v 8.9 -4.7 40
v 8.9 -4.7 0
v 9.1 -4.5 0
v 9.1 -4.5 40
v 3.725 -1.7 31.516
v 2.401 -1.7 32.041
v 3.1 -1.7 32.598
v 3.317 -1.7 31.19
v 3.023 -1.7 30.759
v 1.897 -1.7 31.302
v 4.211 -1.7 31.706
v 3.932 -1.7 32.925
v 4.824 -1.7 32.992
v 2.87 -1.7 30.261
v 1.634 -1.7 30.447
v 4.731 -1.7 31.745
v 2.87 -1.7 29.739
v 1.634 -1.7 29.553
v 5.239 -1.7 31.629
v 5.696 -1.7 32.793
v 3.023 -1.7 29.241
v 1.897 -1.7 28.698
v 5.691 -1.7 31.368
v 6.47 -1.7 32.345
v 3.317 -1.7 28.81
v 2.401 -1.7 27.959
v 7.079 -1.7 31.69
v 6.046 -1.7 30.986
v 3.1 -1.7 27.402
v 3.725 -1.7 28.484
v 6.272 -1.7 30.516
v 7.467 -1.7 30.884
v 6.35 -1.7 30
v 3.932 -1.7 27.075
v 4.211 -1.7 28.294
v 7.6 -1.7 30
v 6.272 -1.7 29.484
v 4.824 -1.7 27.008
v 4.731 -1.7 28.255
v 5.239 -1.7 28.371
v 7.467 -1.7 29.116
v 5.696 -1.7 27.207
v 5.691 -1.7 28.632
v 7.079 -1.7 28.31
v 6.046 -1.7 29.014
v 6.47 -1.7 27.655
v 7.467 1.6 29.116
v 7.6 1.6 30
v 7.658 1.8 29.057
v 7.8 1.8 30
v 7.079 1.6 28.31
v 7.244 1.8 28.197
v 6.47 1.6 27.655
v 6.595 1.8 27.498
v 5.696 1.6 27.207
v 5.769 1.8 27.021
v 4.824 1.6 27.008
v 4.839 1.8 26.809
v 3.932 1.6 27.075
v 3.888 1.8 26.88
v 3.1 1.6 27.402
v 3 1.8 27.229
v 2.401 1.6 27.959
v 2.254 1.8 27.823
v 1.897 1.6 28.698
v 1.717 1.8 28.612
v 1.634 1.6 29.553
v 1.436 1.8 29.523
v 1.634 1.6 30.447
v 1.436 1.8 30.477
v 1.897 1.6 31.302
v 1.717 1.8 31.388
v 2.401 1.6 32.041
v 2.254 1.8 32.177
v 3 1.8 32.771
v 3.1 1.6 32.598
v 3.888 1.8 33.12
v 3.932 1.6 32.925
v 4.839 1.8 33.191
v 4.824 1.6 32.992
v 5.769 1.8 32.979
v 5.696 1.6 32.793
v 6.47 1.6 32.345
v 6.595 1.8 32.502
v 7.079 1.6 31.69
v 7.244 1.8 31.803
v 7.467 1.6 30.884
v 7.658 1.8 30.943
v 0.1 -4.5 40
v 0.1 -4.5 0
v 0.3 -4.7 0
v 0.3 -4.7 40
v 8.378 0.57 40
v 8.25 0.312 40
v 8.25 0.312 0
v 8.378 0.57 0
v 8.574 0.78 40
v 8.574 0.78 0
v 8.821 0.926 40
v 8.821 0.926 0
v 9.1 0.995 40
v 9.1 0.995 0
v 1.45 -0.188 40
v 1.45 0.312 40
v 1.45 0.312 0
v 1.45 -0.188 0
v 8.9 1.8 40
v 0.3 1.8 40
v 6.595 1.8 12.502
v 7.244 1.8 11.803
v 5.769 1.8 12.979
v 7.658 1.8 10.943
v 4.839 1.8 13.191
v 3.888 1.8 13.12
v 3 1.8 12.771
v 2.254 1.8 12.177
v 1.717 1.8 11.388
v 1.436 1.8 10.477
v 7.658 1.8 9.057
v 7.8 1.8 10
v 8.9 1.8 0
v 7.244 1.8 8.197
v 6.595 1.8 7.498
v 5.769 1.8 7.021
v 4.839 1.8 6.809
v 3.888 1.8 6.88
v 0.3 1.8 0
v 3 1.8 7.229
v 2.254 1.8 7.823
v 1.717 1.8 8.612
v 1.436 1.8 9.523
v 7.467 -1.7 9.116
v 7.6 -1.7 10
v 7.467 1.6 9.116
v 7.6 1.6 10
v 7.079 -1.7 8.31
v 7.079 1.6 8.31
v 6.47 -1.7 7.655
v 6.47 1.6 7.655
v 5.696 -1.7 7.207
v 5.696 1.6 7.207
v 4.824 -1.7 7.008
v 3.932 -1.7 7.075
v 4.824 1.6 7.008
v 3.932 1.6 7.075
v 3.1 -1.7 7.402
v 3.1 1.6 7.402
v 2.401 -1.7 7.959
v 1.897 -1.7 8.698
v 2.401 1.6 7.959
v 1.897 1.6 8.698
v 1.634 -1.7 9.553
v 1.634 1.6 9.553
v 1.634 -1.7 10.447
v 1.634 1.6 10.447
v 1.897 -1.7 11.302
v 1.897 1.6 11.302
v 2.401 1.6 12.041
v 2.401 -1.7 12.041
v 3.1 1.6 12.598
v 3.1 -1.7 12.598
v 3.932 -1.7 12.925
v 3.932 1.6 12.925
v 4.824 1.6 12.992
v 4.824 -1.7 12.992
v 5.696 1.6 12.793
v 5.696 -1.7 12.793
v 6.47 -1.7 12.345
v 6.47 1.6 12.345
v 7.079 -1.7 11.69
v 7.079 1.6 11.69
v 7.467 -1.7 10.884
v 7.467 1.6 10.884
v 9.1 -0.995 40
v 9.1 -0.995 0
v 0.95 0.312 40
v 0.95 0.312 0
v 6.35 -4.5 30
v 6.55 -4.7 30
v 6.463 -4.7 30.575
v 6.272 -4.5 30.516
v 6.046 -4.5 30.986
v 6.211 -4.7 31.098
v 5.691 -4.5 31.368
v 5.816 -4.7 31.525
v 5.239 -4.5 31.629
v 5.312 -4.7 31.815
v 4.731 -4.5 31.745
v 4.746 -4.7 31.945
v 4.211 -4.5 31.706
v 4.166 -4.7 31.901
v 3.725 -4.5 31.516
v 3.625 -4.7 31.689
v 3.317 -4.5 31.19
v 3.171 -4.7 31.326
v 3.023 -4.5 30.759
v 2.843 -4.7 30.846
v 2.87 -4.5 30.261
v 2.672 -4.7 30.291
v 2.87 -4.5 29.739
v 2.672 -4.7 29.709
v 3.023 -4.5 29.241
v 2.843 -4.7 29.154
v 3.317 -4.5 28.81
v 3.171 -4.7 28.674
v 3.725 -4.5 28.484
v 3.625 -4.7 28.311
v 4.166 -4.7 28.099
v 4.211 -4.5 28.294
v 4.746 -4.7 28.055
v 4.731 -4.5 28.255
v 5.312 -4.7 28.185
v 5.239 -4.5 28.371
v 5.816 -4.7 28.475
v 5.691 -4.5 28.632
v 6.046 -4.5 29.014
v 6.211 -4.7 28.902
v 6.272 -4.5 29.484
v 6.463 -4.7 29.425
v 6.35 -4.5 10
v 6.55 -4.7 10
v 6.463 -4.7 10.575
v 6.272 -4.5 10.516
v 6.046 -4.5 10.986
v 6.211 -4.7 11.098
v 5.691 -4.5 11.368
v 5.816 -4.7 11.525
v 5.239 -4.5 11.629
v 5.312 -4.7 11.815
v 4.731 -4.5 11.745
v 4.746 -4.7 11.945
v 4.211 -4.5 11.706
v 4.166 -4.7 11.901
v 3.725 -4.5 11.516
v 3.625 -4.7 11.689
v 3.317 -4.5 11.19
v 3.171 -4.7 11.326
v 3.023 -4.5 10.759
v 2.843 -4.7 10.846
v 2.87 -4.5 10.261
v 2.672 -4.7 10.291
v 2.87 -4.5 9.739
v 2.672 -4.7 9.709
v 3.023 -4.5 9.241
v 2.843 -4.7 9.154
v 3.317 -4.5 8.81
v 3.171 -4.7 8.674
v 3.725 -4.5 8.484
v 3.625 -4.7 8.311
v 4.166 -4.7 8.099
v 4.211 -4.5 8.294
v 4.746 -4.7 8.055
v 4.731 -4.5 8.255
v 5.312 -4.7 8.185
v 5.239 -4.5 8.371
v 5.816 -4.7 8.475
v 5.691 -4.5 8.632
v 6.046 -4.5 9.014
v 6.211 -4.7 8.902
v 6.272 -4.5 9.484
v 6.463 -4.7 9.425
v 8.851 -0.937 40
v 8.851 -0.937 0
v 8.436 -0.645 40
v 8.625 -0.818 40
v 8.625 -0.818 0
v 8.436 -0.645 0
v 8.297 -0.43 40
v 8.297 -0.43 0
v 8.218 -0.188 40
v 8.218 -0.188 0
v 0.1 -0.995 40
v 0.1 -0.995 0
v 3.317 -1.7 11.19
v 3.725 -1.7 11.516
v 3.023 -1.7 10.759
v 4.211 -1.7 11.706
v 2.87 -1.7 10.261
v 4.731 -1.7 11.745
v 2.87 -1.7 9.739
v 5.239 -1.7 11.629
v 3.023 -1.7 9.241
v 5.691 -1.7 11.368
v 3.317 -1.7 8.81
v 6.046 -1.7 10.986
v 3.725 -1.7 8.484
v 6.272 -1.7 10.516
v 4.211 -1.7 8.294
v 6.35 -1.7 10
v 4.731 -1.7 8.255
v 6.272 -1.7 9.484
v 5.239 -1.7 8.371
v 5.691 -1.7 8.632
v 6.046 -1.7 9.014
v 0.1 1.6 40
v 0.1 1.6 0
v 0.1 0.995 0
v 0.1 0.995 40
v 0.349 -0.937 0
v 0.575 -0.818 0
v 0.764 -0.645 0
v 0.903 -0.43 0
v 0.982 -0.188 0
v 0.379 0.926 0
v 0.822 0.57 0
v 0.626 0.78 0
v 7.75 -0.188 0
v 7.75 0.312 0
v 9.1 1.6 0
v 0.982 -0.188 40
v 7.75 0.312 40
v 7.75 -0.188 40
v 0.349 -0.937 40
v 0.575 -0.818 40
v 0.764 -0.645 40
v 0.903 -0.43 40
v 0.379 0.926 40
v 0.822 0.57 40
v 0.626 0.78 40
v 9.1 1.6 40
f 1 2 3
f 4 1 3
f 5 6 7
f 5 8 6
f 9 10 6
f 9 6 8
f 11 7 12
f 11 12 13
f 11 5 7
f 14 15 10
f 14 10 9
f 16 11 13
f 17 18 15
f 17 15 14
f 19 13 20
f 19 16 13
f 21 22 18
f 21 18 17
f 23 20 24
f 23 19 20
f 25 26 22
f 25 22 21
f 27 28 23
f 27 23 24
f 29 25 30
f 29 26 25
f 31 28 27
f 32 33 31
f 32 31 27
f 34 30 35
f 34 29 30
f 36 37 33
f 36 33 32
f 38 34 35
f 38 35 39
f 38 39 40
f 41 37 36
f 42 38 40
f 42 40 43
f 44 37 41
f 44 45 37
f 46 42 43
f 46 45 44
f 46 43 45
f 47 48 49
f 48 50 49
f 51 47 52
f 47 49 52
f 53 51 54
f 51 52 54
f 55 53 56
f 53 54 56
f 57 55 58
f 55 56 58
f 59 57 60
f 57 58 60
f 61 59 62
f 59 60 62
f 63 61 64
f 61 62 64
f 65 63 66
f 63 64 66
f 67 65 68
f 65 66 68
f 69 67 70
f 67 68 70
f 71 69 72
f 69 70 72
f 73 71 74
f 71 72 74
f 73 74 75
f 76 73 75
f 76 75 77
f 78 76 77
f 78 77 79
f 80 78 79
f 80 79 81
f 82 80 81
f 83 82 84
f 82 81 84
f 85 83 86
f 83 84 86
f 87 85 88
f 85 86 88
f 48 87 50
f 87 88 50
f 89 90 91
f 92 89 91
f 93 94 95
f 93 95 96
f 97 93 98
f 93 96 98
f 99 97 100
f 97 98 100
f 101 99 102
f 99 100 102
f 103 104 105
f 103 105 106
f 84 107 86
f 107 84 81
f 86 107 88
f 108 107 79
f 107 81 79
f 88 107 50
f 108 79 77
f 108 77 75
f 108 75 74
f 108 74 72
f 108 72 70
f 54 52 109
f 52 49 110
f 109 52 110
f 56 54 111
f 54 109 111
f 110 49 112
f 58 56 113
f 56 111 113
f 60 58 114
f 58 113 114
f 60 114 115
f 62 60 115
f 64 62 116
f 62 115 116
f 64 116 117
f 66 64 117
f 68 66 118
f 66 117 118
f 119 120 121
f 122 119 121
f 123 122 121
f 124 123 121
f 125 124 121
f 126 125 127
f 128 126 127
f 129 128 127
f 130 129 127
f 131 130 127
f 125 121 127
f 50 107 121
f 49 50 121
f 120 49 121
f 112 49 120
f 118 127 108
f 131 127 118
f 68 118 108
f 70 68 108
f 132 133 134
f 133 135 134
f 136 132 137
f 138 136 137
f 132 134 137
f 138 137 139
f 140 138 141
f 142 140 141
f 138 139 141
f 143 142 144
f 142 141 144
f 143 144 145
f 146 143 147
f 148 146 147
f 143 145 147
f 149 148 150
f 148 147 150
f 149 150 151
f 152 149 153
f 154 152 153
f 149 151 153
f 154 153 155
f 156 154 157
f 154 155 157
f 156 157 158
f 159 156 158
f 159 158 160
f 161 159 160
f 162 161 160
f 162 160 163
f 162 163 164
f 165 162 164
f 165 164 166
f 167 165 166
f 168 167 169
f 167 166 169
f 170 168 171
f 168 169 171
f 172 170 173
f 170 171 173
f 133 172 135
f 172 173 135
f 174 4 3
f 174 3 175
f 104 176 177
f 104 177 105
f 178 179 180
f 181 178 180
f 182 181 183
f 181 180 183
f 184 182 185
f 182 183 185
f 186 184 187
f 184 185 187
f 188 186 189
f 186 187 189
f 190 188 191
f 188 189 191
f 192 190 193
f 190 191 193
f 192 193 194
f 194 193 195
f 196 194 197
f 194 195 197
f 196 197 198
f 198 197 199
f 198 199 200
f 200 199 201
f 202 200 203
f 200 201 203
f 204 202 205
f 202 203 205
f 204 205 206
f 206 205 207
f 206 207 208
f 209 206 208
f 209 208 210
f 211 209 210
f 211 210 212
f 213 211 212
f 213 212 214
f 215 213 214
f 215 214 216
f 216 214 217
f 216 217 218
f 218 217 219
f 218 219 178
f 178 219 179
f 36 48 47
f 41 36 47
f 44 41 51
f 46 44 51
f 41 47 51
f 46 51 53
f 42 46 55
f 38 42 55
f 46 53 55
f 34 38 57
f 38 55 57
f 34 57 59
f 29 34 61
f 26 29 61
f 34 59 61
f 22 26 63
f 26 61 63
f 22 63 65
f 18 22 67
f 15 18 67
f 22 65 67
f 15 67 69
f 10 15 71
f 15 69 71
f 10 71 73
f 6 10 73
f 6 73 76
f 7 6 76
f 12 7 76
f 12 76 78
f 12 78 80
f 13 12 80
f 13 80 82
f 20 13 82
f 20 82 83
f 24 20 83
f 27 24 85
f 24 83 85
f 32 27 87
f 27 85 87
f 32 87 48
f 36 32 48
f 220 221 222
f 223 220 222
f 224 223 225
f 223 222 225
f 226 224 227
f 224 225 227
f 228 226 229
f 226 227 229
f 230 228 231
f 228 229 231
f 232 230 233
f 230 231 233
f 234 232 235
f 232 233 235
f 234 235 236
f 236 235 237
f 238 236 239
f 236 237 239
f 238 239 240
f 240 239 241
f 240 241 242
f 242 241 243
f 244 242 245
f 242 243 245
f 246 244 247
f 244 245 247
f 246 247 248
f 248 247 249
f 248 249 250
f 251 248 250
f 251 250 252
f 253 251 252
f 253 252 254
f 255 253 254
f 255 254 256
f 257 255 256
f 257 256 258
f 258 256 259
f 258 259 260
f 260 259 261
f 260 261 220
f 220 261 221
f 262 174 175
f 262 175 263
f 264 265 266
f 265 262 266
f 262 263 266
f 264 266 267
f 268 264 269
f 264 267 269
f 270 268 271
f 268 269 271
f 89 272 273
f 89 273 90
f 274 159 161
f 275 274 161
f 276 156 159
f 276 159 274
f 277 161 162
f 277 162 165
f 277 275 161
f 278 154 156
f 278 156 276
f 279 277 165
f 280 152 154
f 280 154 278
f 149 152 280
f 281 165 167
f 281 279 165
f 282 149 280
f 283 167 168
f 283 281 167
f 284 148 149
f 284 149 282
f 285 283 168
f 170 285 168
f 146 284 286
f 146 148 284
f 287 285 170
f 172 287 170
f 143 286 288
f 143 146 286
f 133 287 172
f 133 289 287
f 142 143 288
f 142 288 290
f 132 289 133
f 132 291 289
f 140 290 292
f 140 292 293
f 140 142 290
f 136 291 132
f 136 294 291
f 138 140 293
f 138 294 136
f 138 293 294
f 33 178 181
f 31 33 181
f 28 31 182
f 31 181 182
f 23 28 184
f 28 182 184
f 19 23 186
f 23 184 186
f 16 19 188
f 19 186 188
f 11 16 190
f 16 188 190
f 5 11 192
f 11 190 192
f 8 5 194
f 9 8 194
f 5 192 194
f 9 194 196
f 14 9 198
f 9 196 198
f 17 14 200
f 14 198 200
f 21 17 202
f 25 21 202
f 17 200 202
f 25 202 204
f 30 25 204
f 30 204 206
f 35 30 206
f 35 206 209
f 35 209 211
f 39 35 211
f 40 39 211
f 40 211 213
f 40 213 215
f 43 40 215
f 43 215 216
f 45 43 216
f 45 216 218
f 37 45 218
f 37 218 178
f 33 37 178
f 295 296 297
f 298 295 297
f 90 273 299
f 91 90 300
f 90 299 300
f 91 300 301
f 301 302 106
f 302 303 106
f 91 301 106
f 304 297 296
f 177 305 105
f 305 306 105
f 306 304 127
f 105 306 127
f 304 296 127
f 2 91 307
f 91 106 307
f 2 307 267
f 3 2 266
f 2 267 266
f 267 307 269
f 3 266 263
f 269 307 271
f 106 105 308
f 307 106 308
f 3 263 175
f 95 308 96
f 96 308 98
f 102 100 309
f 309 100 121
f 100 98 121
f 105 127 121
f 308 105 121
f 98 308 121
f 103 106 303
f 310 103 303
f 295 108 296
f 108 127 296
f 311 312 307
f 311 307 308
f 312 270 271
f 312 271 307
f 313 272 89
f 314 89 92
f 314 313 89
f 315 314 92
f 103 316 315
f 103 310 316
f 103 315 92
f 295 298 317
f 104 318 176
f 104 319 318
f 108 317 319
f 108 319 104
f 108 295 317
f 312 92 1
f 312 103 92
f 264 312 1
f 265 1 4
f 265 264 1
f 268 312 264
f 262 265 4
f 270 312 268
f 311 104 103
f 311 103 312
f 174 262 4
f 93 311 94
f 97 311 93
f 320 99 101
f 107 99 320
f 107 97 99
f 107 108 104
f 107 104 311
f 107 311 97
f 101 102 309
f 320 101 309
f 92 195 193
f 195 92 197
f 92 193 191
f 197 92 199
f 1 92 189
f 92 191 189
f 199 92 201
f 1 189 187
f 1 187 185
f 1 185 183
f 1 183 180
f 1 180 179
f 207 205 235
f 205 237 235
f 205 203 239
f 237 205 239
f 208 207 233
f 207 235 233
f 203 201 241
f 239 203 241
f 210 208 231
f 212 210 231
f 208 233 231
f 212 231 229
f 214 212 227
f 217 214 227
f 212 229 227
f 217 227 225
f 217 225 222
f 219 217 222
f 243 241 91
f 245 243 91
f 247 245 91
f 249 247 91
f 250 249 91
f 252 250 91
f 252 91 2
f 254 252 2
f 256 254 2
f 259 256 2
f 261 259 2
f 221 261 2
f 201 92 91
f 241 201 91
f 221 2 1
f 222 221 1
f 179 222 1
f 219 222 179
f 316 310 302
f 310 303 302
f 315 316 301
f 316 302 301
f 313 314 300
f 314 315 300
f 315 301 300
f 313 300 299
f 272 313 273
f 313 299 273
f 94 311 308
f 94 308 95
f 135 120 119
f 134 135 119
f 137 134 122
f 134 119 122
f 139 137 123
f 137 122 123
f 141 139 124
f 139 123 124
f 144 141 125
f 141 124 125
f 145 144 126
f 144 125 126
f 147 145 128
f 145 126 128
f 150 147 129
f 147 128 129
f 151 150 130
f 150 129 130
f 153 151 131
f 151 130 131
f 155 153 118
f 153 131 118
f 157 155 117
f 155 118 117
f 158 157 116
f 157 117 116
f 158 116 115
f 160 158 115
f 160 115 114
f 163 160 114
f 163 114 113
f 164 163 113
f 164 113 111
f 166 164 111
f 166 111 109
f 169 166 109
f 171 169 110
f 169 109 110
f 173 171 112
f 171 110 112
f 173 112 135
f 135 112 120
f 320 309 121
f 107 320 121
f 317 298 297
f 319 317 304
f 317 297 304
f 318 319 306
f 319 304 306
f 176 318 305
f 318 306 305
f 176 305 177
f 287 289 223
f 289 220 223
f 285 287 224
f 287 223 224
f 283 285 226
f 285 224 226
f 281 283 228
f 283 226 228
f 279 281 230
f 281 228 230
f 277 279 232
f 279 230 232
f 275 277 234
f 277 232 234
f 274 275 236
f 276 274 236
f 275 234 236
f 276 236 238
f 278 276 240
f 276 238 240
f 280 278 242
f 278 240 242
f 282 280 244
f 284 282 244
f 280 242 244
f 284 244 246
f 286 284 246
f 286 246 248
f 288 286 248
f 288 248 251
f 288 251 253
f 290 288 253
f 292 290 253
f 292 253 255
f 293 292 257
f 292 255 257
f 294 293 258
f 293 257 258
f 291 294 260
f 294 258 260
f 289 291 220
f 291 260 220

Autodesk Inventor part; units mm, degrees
ref_plane "YZ Plane" through (0, 0, 0) normal (1, 0, 0) x (0, 1, 0)
ref_plane "XZ Plane" through (0, 0, 0) normal (0, 1, 0) x (-1, 0, 0)
ref_plane "XY Plane" through (0, 0, 0) normal (0, 0, 1) x (1, 0, 0)
sketch "Эскиз1" plane through (0, 0, 0) normal (0, 0, 1) x (1, 0, 0)
  arc A0 (0.9499, 0.3125) -> (0.1, 0.995) centre (0, 0) ccw projected
  line L0 (0.9499, 0.3125) -> (1.4499, 0.3125) projected
  line L1 (1.4499, 0.3125) -> (1.4499, -0.1875) projected
  line L2 (1.4499, -0.1875) -> (0.9823, -0.1875) projected
  arc A1 (0.1, -0.995) -> (0.9823, -0.1875) centre (0, 0) ccw projected
  line L3 (0.1, -0.995) -> (0.1, -4.5) projected
  line L4 (0.1, -4.5) -> (0.3, -4.7) projected
  line L5 (0.3, -4.7) -> (8.9, -4.7) projected
  line L6 (8.9, -4.7) -> (9.1, -4.5) projected
  line L7 (9.1, -4.5) -> (9.1, -0.995) projected
  arc A2 (8.2177, -0.1875) -> (9.1, -0.995) centre (9.2, 0) ccw projected
  line L8 (8.2177, -0.1875) -> (7.7501, -0.1875) projected
  line L9 (7.7501, -0.1875) -> (7.7501, 0.3125) projected
  line L10 (7.7501, 0.3125) -> (8.2501, 0.3125) projected
  arc A3 (9.1, 0.995) -> (8.2501, 0.3125) centre (9.2, 0) ccw projected
  line L11 (9.1, 0.995) -> (9.1, 1.6) projected
  line L12 (9.1, 1.6) -> (8.9, 1.8) projected
  line L13 (8.9, 1.8) -> (0.3, 1.8) projected
  line L14 (0.3, 1.8) -> (0.1, 1.6) projected
  line L15 (0.1, 1.6) -> (0.1, 0.995) projected
extrude "Выдавливание1" add sketch "Эскиз1" along normal blind 40
sketch "Эскиз2" plane through (0.3, 1.8, 0) normal (0, 1, 0) x (1, 0, 0)
  line L0 (4.3, -2.5) -> (4.3, -42.5) construction
  circle A0 centre (4.3, -10) radius 3
  line L1 (8.6, 0) -> (0, 0) projected
  dimension "d3" = 6
  dimension "d25" = 10
extrude "Выдавливание2" cut sketch "Эскиз2" against normal blind 3.5
sketch "Эскиз3" plane through (0.3, -4.7, 0) normal (0, -1, 0) x (1, 0, 0)
  line L0 (0, 0) -> (8.6, 0) construction
  line L1 (4.3, 0) -> (4.3, 8.2468) construction
  circle A0 centre (4.3, 10) radius 1.75
  point P0 (-0.3, 0)
  dimension "d26" = 3.5
  dimension "d27" = 10
extrude "Выдавливание3" cut sketch "Эскиз3" against normal blind 5
chamfer "Фаска1" distance 0.2 angle 45 2 edges at (2.85, -4.7, 10) (1.6, 1.8, 10)
pattern_linear "Прямоуг.массив1" count 2 spacing 20 along (0, 0, 1) of "Выдавливание3", "Выдавливание2", "Фаска1"
properties part number "рельса_мини"
